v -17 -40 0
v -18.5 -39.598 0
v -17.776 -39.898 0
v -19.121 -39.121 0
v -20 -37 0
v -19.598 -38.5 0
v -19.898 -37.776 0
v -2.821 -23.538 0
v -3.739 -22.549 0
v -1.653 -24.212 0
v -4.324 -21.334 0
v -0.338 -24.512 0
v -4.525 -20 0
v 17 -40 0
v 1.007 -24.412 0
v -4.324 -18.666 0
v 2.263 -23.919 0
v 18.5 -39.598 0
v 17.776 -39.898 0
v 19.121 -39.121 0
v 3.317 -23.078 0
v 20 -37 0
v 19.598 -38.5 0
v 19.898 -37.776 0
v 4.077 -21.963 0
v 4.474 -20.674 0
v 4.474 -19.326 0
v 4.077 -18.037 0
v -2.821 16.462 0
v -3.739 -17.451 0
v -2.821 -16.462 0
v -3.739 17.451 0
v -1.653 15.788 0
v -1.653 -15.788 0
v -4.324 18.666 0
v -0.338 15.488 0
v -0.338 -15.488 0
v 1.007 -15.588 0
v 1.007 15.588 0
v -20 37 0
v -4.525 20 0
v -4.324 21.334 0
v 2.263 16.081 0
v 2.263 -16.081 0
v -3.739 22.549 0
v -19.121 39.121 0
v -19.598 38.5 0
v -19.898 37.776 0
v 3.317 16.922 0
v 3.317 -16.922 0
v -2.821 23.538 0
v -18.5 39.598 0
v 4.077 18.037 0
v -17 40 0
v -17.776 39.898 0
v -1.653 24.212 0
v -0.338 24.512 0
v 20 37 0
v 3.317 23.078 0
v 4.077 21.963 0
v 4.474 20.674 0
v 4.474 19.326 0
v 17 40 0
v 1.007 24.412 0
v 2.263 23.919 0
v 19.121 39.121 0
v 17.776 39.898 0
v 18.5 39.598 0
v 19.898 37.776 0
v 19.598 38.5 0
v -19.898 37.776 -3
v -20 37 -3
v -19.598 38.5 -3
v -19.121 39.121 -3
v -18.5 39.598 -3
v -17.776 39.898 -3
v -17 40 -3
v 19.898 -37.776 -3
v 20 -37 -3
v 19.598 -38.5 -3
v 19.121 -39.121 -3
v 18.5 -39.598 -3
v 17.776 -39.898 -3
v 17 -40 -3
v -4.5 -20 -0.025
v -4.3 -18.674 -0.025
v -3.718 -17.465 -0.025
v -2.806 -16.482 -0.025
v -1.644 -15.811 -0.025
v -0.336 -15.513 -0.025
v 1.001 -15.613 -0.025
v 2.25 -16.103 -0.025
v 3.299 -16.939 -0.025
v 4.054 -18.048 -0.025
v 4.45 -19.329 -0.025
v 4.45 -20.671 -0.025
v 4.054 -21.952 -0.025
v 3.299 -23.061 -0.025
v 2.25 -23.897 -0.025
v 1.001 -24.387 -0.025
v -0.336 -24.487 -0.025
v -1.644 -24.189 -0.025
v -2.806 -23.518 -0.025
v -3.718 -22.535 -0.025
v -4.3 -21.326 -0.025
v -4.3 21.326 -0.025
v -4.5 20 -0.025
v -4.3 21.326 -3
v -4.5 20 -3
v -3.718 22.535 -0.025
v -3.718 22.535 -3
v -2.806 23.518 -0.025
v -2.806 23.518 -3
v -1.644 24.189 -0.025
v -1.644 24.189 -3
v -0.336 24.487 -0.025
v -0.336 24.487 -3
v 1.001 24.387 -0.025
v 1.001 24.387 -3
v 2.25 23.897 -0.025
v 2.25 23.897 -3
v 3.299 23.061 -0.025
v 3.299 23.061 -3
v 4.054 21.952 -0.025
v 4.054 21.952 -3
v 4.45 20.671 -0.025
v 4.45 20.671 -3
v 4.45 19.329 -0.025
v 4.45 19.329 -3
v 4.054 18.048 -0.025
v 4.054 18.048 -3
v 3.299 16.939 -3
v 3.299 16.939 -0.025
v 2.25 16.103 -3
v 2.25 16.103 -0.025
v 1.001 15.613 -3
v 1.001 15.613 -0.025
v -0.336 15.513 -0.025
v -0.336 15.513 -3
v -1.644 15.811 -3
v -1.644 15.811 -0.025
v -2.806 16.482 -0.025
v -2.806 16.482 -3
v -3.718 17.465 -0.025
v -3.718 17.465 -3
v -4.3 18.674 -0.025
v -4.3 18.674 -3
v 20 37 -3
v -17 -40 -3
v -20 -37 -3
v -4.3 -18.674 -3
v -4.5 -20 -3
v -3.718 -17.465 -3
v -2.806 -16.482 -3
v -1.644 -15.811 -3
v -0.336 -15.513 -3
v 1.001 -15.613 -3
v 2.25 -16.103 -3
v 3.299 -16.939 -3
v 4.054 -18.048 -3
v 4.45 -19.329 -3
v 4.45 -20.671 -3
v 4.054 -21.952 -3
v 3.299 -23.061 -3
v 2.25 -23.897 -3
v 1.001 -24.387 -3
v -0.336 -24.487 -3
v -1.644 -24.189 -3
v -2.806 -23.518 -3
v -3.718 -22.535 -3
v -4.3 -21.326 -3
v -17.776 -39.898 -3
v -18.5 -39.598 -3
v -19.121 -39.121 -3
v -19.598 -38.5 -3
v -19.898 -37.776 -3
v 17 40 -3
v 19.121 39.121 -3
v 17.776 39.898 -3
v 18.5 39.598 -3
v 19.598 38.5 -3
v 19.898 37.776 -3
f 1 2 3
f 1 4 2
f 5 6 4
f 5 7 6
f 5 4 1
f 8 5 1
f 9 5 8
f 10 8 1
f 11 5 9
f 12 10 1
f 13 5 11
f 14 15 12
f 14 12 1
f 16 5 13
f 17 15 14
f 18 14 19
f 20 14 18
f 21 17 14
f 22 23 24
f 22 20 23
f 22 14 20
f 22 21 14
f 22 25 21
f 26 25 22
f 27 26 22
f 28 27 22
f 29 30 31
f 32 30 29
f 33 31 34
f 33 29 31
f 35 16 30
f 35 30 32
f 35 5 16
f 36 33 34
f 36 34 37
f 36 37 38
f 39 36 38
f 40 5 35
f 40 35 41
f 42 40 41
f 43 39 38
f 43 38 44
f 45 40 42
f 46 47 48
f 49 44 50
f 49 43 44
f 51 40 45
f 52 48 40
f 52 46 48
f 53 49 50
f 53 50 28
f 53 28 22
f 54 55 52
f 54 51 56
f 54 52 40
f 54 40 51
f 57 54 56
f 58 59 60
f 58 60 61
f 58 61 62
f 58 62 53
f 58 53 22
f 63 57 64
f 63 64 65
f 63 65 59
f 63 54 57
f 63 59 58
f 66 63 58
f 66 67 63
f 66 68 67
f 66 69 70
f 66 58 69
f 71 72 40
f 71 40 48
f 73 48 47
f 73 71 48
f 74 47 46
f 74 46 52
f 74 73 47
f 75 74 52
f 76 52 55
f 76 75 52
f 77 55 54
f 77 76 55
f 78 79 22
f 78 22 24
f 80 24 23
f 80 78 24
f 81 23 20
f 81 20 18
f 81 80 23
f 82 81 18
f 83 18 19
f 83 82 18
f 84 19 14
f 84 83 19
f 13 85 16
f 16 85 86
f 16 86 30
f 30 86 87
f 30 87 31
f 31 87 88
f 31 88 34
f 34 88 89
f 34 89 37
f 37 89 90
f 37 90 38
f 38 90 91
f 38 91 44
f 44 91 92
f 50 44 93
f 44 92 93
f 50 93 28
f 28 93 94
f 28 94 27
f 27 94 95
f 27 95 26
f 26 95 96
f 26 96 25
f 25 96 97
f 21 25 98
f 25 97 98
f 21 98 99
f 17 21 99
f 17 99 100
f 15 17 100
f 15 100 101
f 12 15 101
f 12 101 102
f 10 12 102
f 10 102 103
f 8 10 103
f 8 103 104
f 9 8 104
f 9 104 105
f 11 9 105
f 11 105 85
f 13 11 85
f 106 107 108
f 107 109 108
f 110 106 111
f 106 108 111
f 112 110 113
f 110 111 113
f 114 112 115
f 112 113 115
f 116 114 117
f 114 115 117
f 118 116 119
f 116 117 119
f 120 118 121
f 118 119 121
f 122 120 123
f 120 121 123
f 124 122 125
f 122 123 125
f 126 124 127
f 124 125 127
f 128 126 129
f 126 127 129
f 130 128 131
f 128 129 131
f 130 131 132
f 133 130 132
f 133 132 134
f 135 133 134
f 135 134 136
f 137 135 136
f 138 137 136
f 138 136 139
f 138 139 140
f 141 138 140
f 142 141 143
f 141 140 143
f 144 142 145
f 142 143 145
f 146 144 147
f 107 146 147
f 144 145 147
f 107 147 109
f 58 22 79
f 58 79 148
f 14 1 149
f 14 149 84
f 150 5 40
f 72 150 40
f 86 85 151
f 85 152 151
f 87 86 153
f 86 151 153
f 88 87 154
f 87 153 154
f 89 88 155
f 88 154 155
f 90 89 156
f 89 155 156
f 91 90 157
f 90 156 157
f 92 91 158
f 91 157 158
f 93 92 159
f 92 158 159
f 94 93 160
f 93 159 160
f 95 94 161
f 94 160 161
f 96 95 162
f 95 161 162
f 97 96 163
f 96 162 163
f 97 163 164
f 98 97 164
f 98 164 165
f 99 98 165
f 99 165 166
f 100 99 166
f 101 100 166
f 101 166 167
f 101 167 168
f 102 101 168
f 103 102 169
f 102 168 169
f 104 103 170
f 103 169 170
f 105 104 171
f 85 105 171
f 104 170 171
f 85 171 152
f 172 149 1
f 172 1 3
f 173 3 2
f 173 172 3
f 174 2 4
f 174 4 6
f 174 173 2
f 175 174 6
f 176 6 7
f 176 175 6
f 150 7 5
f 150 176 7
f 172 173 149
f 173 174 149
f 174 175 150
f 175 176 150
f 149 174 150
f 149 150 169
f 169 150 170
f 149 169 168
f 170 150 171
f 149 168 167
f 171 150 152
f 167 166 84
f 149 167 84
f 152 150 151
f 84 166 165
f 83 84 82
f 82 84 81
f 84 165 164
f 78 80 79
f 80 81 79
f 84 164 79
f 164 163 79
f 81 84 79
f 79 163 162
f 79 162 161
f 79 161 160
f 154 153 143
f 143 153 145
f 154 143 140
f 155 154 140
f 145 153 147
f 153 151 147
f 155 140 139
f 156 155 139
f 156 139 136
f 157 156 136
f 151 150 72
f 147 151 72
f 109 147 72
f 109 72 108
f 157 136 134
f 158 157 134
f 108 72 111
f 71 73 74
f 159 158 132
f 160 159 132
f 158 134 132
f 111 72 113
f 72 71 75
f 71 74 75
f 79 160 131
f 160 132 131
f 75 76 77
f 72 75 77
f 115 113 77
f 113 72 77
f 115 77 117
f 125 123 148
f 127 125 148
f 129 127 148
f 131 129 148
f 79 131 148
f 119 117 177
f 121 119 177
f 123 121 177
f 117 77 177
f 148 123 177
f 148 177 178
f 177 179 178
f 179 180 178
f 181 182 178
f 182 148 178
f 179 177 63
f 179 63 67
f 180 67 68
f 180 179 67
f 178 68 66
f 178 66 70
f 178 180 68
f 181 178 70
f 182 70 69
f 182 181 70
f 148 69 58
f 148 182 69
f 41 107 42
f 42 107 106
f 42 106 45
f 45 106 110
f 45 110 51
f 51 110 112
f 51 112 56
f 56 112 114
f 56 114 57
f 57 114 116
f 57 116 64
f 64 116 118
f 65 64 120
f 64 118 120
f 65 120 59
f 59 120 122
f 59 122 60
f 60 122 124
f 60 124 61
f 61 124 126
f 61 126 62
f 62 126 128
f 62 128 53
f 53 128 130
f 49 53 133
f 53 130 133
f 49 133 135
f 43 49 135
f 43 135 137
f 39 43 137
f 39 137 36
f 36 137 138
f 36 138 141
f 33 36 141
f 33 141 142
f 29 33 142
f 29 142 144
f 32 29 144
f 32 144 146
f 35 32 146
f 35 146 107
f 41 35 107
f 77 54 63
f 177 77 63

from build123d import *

# Parameters (mm, degrees)
SKETCH_1_W                   = 40
SKETCH_1_H                   = 80
SM_BASE_FLANGE_1_DEPTH       = 3
OTHER_START                  = -3
OTHER_1_DEPTH                = 3
HOLE_WIZARD_M8_1_D           = 9
HOLE_WIZARD_M8_1_DEPTH       = 12.4
HOLE_WIZARD_M8_1_CSINK_D     = 9.05
HOLE_WIZARD_M8_1_CSINK_ANGLE = 90
HOLE_WIZARD_M8_1_TIP         = 2.703872786


# Read off the part's stored shape, not the designer's step: 断开-边角1
# Sheet-metal steps are written as plain solids
with BuildPart() as part:
    # Sketch 1 → 基体-法兰1 (new body)
    with BuildSketch(Plane.XY):
        Rectangle(SKETCH_1_W, SKETCH_1_H)
    extrude(amount=-SM_BASE_FLANGE_1_DEPTH)

    # Other 1 outline → Other 1 (cut)
    with BuildSketch(Plane.XY.offset(OTHER_START)):
        with BuildLine():
            ThreePointArc((20, -37), (19.121320344, -39.121320344), (17, -40))
            Line((17, -40), (20, -40))
            Line((20, -40), (20, -37))
        make_face()
        with BuildLine():
            Line((-20, -40), (-17, -40))
            ThreePointArc((-17, -40), (-19.121320344, -39.121320344), (-20, -37))
            Line((-20, -37), (-20, -40))
        make_face()
        with BuildLine():
            ThreePointArc((17, 40), (19.121320344, 39.121320344), (20, 37))
            Line((20, 37), (20, 40))
            Line((20, 40), (17, 40))
        make_face()
        with BuildLine():
            Line((-20, 40), (-20, 37))
            ThreePointArc((-20, 37), (-19.121320344, 39.121320344), (-17, 40))
            Line((-17, 40), (-20, 40))
        make_face()
    extrude(amount=OTHER_1_DEPTH, mode=Mode.SUBTRACT)

    # M8 间隙孔1
    with Locations(Plane.XY):
        with Locations((0, 20), (0, -20)):
            CounterSinkHole(HOLE_WIZARD_M8_1_D / 2, HOLE_WIZARD_M8_1_CSINK_D / 2, depth=HOLE_WIZARD_M8_1_DEPTH, counter_sink_angle=HOLE_WIZARD_M8_1_CSINK_ANGLE)
            with Locations((0, 0, -(HOLE_WIZARD_M8_1_DEPTH + HOLE_WIZARD_M8_1_TIP / 2))):  # 118° drill point
                Cone(0, HOLE_WIZARD_M8_1_D / 2, HOLE_WIZARD_M8_1_TIP, mode=Mode.SUBTRACT)


solid = part.part
